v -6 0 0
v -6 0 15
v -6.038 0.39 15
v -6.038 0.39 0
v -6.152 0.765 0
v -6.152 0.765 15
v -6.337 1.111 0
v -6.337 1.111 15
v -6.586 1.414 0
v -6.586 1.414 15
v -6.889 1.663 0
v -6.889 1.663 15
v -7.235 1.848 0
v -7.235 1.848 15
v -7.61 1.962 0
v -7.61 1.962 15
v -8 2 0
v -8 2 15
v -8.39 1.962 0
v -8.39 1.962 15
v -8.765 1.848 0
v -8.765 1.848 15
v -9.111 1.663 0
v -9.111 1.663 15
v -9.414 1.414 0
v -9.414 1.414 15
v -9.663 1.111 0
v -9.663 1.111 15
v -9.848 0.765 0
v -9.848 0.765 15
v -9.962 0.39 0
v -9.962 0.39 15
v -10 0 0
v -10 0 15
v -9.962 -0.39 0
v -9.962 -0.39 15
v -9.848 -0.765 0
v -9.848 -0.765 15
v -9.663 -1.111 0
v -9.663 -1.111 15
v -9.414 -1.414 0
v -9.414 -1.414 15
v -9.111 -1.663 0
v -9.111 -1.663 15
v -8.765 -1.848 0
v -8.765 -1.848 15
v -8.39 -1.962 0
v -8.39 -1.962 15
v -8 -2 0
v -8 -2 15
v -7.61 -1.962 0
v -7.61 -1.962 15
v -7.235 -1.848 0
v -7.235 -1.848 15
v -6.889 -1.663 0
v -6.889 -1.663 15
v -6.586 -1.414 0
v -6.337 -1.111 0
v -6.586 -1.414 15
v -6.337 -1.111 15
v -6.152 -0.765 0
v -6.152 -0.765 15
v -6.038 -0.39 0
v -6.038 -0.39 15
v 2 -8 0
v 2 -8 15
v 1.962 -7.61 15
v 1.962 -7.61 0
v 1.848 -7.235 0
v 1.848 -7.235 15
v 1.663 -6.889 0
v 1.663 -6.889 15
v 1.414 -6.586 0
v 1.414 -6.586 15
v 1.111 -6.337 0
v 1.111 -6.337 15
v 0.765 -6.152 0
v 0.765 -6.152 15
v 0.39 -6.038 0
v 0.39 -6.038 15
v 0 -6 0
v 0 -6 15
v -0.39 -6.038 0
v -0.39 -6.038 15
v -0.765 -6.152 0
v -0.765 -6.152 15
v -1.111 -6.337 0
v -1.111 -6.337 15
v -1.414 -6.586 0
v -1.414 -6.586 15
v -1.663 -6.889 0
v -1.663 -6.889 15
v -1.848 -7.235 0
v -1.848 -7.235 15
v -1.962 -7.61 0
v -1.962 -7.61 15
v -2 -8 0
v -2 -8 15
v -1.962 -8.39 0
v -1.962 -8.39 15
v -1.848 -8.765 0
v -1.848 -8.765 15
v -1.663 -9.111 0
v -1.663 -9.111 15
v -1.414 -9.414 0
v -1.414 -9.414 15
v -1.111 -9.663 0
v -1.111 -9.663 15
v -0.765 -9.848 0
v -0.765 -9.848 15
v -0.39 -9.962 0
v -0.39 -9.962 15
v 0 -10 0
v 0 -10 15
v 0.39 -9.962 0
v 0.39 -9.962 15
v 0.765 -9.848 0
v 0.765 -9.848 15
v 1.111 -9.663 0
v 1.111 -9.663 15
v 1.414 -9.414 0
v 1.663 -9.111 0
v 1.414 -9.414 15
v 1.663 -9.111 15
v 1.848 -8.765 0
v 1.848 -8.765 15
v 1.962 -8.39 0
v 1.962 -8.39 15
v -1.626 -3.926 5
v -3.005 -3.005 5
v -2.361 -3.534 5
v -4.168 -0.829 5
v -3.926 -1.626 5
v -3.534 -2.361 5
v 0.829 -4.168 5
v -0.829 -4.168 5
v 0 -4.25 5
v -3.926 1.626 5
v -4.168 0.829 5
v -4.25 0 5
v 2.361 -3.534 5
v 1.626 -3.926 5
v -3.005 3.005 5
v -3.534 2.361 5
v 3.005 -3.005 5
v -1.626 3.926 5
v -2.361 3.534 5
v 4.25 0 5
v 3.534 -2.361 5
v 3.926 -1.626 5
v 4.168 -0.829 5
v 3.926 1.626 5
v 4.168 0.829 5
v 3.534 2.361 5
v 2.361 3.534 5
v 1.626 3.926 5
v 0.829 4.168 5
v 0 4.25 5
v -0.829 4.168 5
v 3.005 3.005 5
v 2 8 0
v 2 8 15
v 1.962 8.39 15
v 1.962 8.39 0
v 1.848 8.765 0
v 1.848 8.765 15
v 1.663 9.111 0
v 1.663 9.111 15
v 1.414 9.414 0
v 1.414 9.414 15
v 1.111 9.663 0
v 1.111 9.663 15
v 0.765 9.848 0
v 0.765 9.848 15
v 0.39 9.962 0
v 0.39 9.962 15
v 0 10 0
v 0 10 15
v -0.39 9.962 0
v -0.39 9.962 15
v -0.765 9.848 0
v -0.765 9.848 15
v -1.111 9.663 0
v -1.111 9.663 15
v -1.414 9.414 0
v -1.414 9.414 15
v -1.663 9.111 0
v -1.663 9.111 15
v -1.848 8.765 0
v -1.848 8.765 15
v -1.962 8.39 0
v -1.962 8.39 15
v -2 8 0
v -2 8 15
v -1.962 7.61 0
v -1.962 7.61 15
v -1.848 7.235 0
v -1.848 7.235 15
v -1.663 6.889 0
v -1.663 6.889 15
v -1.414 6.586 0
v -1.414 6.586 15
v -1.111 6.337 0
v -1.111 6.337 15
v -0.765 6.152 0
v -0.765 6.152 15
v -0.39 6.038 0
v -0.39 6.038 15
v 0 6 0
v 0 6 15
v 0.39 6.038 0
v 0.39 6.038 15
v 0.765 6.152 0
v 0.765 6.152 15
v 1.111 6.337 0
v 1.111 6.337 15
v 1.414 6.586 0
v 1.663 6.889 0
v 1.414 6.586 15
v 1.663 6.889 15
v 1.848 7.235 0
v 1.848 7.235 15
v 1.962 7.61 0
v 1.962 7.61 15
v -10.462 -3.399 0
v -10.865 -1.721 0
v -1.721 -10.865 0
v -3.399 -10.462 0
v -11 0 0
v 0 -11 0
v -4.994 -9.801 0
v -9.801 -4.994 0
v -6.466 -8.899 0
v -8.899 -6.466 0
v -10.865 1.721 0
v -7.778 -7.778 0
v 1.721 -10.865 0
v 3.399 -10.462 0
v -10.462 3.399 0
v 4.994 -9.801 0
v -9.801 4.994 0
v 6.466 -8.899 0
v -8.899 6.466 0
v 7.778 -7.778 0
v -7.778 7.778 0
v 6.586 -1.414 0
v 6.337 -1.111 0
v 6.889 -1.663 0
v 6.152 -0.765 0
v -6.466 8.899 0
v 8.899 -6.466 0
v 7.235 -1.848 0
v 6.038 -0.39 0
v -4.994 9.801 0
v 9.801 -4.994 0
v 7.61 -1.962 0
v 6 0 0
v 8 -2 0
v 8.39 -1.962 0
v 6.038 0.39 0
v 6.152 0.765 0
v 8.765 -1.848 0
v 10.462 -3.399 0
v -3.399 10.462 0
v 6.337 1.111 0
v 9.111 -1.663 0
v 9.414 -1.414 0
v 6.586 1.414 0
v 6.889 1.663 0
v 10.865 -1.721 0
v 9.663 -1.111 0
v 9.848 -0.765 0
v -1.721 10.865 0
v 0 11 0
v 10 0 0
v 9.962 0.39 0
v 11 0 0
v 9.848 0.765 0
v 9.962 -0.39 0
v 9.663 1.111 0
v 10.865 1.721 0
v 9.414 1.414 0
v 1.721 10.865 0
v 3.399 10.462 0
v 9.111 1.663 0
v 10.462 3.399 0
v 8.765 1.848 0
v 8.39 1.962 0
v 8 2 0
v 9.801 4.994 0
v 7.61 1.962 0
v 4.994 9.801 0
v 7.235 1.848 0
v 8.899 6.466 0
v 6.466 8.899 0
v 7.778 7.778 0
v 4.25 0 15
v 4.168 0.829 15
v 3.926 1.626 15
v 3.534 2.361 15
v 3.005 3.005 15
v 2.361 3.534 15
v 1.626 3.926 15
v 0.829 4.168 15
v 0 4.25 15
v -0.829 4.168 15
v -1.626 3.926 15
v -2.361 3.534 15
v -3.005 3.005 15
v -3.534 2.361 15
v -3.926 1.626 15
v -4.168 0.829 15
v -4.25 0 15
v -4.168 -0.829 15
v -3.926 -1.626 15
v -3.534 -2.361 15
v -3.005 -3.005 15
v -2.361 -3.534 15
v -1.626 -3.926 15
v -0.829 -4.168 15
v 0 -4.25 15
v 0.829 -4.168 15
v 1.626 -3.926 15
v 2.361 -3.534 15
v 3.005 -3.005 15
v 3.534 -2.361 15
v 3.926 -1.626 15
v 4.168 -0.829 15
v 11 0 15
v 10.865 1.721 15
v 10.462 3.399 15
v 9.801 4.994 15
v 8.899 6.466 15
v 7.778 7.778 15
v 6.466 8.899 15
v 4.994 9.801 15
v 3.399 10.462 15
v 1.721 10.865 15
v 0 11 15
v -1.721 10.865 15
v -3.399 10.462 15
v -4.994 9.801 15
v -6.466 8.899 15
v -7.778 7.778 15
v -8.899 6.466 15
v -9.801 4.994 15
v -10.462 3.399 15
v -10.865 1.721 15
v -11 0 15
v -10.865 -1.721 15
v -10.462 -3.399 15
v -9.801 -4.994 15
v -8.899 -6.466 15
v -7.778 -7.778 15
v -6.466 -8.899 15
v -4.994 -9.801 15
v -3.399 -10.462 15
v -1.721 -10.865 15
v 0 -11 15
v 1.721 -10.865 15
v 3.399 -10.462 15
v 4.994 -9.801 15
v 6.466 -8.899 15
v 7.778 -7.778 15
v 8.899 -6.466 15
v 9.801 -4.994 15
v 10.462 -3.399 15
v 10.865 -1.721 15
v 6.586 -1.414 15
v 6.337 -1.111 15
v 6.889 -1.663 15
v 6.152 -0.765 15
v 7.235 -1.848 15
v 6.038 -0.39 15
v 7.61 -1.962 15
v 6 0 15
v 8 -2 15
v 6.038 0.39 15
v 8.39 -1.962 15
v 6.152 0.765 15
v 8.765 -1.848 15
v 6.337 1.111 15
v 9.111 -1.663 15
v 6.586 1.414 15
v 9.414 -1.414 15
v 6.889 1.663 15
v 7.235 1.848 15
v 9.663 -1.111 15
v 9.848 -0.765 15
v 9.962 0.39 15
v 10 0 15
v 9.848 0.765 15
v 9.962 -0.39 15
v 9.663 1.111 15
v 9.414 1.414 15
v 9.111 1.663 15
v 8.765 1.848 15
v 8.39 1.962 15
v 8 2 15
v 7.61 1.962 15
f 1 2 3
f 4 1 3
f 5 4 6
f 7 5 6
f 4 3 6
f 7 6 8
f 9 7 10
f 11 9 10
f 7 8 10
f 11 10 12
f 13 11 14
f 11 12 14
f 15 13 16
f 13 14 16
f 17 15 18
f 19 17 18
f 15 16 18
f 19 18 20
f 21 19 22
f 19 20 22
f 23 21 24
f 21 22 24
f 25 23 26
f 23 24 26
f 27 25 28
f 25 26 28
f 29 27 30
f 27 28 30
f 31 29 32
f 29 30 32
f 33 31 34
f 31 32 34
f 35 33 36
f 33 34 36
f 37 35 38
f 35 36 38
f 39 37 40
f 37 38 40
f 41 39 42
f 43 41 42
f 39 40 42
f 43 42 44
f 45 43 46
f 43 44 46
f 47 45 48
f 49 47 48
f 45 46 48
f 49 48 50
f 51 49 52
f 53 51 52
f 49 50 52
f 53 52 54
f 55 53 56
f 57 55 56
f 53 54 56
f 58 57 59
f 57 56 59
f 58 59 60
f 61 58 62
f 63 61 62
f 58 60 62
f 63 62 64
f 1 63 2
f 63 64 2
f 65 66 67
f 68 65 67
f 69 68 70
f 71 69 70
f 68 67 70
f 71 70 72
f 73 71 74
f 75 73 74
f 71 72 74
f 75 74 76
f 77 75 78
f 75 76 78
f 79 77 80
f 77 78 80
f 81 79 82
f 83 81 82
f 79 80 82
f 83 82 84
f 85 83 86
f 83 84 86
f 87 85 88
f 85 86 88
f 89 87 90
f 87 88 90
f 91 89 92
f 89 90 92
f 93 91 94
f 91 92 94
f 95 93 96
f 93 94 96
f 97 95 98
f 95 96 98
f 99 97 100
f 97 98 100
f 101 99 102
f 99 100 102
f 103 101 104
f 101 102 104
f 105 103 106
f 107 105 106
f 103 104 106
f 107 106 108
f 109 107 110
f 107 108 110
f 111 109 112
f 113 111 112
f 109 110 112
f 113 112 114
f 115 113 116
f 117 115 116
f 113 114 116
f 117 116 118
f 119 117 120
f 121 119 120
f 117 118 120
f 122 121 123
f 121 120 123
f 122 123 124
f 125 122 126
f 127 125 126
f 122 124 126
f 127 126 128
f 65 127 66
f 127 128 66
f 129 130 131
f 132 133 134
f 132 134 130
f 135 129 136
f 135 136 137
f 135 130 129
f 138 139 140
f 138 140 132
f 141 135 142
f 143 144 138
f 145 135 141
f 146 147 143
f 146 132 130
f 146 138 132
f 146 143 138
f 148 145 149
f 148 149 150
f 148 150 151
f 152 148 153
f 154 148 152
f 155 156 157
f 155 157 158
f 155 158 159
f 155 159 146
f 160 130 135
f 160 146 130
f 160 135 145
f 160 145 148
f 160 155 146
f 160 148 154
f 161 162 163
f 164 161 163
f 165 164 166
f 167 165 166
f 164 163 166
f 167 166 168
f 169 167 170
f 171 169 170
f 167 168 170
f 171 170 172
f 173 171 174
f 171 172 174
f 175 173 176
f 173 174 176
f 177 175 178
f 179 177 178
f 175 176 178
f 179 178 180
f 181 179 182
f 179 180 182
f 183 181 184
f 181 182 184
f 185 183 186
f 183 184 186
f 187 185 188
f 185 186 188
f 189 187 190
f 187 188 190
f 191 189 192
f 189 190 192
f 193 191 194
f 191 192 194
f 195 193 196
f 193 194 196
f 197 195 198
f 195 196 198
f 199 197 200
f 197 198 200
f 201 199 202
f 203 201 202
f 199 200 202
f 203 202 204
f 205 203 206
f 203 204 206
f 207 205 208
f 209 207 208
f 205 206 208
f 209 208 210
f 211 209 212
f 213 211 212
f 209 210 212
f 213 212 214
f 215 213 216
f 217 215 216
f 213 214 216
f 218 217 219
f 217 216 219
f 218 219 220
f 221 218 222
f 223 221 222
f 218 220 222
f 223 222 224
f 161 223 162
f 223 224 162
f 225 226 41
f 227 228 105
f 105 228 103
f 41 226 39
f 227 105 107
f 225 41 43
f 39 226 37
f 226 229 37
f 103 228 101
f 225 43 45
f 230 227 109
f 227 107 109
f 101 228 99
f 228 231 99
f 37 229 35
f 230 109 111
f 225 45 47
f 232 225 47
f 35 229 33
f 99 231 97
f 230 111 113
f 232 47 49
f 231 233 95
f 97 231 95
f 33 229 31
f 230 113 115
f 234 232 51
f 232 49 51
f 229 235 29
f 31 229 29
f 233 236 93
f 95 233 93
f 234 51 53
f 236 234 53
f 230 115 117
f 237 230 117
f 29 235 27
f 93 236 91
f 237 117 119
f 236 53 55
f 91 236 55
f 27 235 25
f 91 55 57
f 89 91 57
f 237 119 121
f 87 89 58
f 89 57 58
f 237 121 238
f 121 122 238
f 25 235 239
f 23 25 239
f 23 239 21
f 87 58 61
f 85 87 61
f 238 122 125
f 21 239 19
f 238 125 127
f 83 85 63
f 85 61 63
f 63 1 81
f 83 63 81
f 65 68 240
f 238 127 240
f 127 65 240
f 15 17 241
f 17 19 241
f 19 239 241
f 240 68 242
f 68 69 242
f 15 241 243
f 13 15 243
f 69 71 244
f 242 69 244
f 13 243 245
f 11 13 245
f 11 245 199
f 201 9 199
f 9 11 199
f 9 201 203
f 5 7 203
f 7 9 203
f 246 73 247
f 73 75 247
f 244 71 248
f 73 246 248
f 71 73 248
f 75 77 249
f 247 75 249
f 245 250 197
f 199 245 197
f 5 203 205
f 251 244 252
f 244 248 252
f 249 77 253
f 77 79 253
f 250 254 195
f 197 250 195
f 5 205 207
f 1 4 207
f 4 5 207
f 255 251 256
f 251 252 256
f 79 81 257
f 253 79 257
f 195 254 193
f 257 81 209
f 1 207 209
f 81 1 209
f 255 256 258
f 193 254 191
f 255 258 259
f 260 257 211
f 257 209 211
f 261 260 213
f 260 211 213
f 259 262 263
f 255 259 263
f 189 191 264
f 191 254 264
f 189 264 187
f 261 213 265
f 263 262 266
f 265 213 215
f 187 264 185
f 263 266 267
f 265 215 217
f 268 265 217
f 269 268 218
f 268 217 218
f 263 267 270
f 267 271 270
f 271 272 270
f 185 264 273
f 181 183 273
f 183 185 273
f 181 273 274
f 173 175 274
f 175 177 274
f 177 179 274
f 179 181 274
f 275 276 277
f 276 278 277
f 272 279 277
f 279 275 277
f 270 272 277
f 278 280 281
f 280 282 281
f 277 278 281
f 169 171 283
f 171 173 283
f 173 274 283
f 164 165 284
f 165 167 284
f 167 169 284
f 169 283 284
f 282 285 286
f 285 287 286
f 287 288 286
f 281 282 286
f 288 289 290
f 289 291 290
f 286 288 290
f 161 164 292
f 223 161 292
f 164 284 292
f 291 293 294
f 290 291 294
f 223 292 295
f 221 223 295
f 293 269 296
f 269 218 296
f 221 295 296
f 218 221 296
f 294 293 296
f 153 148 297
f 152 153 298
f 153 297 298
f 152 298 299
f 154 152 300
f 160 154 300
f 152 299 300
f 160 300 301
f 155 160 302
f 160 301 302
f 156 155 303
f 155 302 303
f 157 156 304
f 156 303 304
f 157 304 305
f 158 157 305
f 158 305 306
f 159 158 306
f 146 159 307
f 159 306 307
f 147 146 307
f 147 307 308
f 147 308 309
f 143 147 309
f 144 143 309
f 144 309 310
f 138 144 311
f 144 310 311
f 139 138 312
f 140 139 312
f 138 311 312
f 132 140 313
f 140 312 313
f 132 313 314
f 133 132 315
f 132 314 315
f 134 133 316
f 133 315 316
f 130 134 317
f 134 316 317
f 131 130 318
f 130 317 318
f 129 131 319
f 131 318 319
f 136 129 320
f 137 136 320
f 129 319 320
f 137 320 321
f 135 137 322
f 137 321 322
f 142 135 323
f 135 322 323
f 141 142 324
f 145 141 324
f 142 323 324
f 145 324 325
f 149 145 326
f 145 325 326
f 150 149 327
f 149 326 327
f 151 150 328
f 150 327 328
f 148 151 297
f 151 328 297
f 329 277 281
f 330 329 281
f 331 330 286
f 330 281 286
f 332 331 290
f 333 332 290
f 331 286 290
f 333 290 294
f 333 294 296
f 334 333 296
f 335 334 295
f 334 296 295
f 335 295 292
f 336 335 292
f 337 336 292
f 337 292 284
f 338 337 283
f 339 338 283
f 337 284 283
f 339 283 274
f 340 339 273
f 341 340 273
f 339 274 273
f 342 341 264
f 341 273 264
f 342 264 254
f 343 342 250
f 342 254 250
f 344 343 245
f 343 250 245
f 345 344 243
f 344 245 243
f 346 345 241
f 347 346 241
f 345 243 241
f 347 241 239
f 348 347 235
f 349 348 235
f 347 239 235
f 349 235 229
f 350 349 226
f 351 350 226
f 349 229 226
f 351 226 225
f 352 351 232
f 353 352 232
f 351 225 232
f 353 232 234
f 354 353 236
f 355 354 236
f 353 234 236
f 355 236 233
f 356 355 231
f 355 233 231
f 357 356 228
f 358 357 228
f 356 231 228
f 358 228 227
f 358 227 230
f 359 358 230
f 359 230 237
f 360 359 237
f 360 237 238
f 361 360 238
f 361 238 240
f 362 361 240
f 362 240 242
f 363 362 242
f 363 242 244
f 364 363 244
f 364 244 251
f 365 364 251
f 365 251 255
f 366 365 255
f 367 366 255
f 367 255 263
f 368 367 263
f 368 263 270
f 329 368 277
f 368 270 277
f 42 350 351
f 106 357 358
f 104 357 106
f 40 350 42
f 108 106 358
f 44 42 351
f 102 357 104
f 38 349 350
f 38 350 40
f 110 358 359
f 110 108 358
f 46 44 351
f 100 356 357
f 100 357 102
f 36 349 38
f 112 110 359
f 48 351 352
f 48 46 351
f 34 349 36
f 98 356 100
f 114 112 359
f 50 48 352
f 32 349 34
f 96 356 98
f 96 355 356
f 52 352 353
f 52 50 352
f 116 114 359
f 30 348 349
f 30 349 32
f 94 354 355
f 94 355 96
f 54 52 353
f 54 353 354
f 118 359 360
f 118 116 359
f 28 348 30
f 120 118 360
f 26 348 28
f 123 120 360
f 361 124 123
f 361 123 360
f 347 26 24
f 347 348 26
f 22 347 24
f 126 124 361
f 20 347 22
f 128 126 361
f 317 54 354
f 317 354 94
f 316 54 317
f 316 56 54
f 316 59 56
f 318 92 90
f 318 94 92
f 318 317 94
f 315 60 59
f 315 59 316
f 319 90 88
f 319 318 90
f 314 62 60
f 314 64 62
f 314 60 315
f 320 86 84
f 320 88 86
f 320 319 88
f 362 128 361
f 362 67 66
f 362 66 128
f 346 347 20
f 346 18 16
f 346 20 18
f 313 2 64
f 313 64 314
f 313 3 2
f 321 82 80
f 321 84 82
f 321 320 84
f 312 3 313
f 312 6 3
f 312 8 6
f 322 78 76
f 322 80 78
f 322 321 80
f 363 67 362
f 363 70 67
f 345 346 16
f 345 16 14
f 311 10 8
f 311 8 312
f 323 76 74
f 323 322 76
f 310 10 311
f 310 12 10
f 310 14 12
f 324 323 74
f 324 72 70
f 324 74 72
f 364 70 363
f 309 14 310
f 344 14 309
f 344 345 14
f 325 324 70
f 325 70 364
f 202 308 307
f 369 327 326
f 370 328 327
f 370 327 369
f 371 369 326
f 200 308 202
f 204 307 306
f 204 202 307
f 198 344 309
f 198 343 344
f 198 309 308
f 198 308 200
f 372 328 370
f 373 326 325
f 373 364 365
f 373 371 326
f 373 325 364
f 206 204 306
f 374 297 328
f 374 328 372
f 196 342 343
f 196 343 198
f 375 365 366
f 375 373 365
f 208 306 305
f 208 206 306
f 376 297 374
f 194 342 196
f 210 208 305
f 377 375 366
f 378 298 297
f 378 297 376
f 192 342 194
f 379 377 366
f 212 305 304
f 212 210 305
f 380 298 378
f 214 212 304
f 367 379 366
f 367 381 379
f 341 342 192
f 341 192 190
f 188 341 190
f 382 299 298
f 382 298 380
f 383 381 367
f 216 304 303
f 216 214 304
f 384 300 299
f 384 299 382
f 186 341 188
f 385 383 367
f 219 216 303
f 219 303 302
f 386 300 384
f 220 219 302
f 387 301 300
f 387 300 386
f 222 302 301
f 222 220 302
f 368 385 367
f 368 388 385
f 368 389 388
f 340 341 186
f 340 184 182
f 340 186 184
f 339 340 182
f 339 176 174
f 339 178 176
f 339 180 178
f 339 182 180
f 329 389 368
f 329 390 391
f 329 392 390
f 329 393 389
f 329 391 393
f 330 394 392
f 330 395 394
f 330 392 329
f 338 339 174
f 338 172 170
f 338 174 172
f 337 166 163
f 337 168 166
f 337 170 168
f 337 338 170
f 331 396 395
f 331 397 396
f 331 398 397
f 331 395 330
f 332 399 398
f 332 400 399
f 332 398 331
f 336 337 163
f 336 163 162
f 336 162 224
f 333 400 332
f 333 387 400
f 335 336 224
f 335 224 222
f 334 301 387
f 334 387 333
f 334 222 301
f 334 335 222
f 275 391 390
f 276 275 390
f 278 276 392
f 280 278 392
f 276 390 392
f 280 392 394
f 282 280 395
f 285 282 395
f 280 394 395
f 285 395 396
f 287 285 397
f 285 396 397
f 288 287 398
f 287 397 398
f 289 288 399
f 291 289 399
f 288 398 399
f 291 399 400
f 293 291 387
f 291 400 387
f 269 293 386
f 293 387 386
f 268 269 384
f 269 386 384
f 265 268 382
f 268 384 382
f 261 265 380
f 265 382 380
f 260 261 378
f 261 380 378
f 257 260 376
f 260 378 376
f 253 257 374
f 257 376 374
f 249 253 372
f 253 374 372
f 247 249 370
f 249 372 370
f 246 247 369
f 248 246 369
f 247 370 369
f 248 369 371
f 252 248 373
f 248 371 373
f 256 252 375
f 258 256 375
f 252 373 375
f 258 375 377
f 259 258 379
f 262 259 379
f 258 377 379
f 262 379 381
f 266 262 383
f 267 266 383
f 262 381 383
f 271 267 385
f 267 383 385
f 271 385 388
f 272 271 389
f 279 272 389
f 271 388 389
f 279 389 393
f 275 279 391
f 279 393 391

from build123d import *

# Parameters (mm, degrees)
SKETCH1_R           = 11
BOSS_EXTRUDE1_DEPTH = 15
SKETCH3_R           = 2
CUT_EXTRUDE1_DEPTH  = 15
SKETCH4_R           = 4.25
CUT_EXTRUDE2_DEPTH  = 10


with BuildPart() as part:
    # Sketch1 → Boss-Extrude1 (new body)
    with BuildSketch(Plane.XY):
        Circle(SKETCH1_R)
    extrude(amount=BOSS_EXTRUDE1_DEPTH)

    # Sketch3 → Cut-Extrude1 (cut)
    with BuildSketch(Plane.XY.offset(15)):
        with Locations((-8, 0)):
            Circle(SKETCH3_R)
        with Locations((0, 8)):
            Circle(SKETCH3_R)
        with Locations((8, 0)):
            Circle(SKETCH3_R)
        with Locations((0, -8)):
            Circle(SKETCH3_R)
    extrude(amount=-CUT_EXTRUDE1_DEPTH, mode=Mode.SUBTRACT)

    # Sketch4 → Cut-Extrude2 (cut)
    with BuildSketch(Plane.XY.offset(15)):
        Circle(SKETCH4_R)
    extrude(amount=-CUT_EXTRUDE2_DEPTH, mode=Mode.SUBTRACT)


solid = part.part
